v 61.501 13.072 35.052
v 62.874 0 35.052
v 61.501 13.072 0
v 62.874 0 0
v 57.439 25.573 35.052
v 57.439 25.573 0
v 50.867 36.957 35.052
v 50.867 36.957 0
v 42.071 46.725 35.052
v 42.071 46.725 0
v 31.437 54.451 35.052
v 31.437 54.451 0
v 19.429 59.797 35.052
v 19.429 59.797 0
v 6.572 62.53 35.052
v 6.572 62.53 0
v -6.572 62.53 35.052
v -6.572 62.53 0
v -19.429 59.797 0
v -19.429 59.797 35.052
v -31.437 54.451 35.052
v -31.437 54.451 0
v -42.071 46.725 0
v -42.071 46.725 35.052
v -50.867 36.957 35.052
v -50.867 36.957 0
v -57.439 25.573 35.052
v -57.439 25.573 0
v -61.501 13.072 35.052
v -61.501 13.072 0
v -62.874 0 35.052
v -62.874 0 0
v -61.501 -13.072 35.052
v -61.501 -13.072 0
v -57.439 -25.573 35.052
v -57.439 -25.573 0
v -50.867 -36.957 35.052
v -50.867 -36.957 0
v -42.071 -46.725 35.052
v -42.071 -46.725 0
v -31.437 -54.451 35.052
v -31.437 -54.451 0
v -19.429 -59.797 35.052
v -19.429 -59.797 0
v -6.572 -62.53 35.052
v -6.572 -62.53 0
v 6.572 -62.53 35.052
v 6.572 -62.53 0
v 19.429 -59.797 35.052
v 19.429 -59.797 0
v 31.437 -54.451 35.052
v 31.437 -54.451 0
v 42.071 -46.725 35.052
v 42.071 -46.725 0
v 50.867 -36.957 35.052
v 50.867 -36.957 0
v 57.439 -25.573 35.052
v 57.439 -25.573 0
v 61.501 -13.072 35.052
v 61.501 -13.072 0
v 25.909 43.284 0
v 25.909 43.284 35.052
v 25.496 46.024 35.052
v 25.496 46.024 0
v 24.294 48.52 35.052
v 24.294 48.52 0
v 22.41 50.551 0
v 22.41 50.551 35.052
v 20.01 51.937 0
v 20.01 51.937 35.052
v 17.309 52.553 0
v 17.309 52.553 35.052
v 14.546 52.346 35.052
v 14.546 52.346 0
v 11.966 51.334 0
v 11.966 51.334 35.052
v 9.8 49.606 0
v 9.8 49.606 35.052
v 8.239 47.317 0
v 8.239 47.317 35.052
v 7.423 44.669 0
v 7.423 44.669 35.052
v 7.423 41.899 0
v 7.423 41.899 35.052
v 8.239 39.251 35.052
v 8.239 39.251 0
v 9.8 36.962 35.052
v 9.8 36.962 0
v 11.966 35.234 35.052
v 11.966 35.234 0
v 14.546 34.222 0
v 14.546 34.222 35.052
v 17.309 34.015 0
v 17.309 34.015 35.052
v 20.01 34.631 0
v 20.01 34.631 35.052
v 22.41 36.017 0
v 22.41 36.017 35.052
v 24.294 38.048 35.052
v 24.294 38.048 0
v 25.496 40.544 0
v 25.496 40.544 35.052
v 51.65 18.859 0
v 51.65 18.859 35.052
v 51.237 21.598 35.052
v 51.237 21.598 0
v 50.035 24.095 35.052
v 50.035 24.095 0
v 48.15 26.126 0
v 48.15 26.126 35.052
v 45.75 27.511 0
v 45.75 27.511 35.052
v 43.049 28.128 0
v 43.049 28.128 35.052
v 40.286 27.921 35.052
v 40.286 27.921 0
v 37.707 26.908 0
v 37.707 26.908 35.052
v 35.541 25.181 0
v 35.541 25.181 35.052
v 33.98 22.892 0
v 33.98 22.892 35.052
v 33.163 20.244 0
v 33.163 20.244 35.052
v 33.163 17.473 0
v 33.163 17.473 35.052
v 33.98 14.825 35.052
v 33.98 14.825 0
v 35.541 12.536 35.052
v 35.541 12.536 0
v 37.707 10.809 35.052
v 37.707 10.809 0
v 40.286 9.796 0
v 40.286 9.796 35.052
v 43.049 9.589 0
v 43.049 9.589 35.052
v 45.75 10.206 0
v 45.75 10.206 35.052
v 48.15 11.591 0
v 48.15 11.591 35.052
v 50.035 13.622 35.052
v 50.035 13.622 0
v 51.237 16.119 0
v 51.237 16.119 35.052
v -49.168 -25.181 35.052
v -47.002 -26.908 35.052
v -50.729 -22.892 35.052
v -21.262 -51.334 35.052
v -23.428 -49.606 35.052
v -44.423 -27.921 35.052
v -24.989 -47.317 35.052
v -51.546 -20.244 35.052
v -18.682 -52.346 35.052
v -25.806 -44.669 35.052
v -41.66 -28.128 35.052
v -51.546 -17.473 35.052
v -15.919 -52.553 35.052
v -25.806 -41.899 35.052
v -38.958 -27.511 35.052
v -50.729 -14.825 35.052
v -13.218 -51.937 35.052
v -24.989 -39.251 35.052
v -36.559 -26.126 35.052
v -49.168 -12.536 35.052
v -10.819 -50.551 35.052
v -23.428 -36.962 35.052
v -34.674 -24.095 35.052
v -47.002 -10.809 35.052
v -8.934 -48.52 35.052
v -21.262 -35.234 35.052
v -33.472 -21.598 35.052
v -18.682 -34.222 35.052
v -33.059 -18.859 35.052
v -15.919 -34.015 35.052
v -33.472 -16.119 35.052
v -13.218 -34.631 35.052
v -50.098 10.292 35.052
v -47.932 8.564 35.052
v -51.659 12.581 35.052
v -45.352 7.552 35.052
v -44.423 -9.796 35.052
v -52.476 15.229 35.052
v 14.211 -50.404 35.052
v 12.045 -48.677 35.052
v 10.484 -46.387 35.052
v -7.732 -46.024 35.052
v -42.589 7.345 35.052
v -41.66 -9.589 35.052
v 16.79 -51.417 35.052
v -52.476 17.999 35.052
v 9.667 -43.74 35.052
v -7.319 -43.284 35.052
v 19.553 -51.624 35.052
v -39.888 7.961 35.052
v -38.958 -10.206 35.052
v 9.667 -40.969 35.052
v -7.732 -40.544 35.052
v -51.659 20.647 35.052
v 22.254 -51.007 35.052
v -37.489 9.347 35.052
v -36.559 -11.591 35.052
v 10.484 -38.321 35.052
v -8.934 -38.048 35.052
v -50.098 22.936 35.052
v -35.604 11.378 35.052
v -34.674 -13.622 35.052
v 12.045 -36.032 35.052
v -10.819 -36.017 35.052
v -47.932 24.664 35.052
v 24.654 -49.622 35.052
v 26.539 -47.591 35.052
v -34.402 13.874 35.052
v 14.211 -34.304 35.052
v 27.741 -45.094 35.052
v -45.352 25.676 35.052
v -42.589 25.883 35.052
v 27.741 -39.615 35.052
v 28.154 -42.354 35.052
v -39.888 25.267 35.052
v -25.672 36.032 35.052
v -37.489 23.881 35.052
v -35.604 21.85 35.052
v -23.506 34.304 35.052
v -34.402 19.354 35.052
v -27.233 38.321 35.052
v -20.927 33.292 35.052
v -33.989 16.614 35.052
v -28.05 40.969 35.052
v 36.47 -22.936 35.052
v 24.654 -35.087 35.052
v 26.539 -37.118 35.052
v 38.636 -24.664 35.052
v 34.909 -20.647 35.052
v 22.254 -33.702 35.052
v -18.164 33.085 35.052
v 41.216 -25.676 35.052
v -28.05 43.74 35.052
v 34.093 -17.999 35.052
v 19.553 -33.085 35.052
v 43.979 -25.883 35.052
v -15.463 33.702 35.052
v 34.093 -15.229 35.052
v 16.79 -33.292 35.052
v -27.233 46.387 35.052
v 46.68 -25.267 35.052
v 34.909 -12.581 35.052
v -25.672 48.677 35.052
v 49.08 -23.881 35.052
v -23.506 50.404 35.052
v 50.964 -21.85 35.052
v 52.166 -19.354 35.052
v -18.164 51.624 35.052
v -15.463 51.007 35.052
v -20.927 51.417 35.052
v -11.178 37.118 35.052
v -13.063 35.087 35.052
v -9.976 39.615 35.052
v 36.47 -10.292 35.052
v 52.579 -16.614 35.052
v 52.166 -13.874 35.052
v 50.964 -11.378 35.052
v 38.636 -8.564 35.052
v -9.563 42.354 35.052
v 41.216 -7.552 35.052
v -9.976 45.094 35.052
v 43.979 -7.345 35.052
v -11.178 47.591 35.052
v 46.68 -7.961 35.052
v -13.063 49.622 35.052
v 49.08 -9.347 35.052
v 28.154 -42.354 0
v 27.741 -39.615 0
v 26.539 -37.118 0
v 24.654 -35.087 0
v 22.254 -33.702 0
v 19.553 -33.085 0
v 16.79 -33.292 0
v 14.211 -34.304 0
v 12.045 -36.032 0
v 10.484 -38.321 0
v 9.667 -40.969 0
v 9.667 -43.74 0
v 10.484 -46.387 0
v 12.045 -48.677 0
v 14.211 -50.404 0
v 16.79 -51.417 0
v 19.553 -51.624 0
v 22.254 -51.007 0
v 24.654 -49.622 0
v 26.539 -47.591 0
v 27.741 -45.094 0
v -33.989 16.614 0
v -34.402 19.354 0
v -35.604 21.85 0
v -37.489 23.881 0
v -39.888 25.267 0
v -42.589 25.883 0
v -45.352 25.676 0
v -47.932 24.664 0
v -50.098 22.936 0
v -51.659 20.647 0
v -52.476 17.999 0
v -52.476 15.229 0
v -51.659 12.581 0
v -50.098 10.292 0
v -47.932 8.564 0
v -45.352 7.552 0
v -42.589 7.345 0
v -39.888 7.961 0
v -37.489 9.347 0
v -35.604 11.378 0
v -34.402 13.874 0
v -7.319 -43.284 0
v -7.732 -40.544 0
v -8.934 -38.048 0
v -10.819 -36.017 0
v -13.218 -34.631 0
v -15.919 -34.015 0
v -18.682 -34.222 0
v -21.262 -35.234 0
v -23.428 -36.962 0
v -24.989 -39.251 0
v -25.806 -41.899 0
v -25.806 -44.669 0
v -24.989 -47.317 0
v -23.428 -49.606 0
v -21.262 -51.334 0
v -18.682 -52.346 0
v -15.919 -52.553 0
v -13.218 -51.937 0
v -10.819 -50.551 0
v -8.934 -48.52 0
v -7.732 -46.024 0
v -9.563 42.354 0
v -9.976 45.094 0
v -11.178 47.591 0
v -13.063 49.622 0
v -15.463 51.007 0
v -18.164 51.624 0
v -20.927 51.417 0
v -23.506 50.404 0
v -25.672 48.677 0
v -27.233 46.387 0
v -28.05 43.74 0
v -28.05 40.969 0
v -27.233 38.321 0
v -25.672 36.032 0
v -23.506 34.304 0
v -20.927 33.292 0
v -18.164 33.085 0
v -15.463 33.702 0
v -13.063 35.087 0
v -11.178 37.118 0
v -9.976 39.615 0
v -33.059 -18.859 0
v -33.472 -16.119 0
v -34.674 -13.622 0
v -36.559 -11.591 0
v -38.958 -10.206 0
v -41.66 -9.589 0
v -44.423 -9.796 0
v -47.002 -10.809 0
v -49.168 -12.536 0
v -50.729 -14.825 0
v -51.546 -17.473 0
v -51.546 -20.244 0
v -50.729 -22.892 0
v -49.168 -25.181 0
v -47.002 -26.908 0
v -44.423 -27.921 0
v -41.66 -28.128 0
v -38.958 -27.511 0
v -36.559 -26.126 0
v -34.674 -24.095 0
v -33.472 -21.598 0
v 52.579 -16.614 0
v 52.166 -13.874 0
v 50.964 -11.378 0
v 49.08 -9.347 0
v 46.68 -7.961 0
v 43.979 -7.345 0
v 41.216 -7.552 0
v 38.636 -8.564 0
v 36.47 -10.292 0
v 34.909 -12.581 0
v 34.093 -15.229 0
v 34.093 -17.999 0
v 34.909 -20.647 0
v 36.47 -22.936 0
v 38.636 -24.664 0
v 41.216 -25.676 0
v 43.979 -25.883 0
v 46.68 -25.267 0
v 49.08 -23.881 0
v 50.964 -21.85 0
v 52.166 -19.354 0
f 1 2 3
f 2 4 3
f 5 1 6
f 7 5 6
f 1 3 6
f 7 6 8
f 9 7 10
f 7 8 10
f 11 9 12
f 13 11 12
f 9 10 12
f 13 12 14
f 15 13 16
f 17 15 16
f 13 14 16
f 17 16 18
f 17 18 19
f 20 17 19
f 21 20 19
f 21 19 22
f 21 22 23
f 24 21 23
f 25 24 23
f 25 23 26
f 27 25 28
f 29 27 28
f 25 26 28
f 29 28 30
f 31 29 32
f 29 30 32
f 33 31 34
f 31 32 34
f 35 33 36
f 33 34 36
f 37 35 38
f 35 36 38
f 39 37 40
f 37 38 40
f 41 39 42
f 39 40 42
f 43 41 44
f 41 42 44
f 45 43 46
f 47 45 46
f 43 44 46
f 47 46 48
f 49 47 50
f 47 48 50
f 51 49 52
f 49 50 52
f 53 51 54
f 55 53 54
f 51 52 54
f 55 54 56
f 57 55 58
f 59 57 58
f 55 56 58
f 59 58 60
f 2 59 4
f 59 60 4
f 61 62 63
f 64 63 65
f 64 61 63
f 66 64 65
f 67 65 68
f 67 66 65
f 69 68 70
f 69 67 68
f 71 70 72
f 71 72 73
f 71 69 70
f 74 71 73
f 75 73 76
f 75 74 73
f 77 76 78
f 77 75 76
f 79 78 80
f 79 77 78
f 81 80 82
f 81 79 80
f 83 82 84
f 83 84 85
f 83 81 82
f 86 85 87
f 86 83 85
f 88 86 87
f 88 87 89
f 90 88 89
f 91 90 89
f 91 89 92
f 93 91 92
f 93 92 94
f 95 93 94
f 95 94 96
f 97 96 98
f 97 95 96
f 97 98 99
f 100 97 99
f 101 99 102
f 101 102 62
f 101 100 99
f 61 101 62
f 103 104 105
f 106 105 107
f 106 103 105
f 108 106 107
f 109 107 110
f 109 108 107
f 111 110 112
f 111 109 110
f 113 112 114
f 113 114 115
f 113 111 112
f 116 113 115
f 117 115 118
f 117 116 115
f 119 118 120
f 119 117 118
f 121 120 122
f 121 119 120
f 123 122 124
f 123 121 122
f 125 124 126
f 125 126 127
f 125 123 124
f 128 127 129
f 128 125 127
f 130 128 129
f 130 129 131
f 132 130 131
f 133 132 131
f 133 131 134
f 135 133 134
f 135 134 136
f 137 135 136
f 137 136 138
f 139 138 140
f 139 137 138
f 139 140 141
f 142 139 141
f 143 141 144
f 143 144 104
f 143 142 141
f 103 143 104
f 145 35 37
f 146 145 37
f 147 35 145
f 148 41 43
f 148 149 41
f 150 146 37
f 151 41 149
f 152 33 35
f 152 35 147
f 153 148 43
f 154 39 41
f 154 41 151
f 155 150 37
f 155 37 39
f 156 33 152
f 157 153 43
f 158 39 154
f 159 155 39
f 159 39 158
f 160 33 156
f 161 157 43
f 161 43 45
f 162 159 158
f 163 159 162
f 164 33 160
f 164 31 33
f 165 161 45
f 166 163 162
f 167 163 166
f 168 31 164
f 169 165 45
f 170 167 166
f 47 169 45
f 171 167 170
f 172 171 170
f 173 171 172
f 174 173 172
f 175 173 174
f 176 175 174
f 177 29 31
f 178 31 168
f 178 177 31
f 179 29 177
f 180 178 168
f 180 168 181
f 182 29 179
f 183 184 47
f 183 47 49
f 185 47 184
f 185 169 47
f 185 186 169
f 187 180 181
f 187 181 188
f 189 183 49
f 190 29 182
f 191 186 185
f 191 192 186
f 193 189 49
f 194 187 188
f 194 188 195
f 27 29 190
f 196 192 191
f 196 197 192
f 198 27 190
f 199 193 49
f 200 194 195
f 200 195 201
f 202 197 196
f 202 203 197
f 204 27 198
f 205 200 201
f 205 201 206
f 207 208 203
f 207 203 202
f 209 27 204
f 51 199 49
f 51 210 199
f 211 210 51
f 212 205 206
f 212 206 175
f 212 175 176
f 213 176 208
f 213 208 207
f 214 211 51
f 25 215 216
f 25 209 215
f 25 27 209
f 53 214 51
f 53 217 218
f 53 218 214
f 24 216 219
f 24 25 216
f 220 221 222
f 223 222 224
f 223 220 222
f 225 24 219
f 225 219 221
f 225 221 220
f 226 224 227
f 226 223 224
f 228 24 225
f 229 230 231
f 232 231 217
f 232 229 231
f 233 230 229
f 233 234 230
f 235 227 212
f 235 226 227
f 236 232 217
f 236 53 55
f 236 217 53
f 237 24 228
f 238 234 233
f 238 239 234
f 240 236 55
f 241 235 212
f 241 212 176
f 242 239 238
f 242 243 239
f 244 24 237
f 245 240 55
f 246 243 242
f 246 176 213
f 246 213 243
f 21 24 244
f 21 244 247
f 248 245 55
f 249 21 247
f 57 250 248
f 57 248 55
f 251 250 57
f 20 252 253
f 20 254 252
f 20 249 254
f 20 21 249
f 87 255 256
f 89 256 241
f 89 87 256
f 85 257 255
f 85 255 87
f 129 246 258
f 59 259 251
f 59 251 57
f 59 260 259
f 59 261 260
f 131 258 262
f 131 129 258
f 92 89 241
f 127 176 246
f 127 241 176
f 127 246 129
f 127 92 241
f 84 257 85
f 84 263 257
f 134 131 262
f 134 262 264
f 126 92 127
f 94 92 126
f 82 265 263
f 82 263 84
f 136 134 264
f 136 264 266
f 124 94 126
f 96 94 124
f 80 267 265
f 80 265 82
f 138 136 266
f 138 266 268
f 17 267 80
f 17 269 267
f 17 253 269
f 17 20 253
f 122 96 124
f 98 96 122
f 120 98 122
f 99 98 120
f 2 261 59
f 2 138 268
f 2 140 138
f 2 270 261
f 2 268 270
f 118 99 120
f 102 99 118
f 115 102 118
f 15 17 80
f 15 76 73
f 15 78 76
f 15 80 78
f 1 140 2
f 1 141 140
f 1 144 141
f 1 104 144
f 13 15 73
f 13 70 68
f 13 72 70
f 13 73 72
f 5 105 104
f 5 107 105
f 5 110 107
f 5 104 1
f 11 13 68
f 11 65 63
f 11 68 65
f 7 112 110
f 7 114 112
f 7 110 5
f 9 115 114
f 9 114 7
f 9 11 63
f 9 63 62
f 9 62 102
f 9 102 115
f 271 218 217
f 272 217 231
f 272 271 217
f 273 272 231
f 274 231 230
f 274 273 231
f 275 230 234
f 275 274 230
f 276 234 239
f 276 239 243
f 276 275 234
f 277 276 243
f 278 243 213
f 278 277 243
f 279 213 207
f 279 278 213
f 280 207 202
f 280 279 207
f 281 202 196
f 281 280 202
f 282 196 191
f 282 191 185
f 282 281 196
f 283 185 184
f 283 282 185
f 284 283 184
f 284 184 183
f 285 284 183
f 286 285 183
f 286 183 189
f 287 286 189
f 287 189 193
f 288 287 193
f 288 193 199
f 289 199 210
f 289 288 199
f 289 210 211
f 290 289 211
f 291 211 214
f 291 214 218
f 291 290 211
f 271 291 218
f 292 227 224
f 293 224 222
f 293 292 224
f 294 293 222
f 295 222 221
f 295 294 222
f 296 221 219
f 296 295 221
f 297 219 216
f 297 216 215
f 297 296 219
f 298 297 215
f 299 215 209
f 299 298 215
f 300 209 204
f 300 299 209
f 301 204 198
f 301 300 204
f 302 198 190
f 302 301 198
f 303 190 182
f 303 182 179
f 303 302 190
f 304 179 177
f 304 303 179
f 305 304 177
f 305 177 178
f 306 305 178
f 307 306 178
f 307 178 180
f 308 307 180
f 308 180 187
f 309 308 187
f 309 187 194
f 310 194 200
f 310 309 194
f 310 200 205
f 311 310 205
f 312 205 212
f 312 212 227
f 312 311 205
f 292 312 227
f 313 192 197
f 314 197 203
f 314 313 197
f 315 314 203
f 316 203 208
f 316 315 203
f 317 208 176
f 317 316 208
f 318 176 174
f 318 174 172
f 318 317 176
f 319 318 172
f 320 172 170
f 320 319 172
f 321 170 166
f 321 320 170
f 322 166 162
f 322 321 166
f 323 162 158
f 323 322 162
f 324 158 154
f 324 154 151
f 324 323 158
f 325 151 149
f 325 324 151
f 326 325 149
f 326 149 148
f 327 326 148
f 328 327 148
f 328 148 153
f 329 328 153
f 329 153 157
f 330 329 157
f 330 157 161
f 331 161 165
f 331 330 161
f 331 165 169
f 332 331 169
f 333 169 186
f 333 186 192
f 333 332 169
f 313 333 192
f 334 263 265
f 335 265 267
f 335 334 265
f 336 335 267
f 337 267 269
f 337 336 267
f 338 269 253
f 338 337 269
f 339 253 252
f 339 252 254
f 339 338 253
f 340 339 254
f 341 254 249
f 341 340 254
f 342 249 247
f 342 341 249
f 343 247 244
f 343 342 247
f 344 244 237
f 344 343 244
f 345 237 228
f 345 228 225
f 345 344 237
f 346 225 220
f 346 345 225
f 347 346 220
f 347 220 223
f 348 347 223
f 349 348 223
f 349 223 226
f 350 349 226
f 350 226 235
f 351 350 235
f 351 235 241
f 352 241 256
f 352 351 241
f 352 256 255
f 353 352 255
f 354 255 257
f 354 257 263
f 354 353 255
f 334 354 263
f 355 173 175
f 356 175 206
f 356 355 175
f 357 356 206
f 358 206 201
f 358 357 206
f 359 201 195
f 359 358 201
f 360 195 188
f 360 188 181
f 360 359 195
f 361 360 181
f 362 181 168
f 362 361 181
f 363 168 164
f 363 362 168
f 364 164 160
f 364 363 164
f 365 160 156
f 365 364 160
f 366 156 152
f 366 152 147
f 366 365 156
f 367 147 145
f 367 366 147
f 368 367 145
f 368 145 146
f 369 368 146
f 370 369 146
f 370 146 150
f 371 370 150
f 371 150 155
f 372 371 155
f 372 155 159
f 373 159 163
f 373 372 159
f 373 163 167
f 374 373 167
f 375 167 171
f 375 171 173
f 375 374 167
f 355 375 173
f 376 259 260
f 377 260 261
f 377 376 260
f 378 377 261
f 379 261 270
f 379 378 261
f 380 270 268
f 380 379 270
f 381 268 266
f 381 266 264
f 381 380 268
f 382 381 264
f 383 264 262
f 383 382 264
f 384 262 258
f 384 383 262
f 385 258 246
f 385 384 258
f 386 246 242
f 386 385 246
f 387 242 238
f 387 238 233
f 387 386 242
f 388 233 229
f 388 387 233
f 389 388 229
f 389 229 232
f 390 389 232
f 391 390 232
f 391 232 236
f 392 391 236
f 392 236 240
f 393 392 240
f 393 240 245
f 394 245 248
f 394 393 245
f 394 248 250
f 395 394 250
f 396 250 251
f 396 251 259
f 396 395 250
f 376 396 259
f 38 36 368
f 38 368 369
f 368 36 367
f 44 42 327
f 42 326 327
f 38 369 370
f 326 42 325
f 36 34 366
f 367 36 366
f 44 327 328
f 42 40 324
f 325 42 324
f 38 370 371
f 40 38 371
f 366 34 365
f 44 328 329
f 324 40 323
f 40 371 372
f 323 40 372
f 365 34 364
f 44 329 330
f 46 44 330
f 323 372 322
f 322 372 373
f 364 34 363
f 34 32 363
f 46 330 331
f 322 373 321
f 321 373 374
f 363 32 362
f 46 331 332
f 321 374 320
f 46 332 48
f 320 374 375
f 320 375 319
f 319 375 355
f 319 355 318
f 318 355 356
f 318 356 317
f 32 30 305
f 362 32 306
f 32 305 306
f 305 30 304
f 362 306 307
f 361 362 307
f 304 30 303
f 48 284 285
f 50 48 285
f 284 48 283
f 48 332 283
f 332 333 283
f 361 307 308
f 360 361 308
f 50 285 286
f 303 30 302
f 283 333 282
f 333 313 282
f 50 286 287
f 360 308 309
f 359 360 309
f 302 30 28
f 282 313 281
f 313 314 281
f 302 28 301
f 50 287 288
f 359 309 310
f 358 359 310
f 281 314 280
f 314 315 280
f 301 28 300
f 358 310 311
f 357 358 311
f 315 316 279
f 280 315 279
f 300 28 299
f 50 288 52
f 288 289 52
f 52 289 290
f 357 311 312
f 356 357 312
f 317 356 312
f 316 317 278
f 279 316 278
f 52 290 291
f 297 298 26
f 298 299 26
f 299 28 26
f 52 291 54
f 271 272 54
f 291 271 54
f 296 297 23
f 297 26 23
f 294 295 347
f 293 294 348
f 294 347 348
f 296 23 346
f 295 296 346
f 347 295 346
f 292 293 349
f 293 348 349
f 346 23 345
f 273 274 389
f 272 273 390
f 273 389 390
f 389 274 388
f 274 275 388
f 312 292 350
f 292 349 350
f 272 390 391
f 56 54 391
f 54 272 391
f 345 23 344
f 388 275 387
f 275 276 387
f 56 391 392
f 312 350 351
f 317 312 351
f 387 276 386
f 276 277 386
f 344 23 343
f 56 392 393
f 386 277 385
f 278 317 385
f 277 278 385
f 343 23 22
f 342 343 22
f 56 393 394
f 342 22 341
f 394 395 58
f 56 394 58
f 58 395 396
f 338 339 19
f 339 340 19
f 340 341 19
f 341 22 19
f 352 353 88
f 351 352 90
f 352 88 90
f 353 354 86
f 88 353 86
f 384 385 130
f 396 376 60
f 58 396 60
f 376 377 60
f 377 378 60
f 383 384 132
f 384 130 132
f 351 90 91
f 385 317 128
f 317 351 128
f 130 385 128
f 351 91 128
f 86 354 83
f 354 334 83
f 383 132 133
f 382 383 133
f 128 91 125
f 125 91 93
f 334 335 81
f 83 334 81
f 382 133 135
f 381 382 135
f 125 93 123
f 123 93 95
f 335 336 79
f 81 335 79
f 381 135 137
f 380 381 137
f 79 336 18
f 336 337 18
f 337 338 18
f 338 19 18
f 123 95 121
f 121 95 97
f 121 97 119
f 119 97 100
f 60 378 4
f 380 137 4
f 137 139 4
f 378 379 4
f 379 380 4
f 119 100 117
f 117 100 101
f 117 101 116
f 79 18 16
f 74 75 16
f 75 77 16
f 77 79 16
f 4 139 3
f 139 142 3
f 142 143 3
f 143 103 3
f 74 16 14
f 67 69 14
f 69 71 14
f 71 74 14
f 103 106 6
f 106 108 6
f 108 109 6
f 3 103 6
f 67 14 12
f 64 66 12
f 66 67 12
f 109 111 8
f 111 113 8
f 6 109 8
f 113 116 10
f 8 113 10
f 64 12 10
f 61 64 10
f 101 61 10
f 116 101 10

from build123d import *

# Parameters (mm, degrees)
F0_R        = 62.874462
F0_R_2      = 9.295278
F1_DEPTH    = 9.652
F1_FACE_R   = 62.874462
F1_FACE_R_2 = 9.295278
F2_DEPTH    = 25.4


with BuildPart() as f1:
    # F0 (on Top) → F1 (new body)
    with BuildSketch(Plane.XY):
        Circle(F0_R)
        with Locations((-16.614098, -43.2841)):
            Circle(F0_R_2, mode=Mode.SUBTRACT)
        with Locations((-42.354422, -18.858539)):
            Circle(F0_R_2, mode=Mode.SUBTRACT)
        with Locations((18.858539, -42.354422)):
            Circle(F0_R_2, mode=Mode.SUBTRACT)
        with Locations((43.2841, -16.614098)):
            Circle(F0_R_2, mode=Mode.SUBTRACT)
        with Locations((-43.2841, 16.614098)):
            Circle(F0_R_2, mode=Mode.SUBTRACT)
        with Locations((-18.858539, 42.354422)):
            Circle(F0_R_2, mode=Mode.SUBTRACT)
        with Locations((42.354422, 18.858539)):
            Circle(F0_R_2, mode=Mode.SUBTRACT)
        with Locations((16.614098, 43.2841)):
            Circle(F0_R_2, mode=Mode.SUBTRACT)
    extrude(amount=F1_DEPTH)

    # F1_face (on face) → F2 (join)
    with BuildSketch(Plane.XY.offset(9.652)):
        Circle(F1_FACE_R)
        with Locations((-16.614098, -43.2841)):
            Circle(F1_FACE_R_2, mode=Mode.SUBTRACT)
        with Locations((-42.354422, -18.858539)):
            Circle(F1_FACE_R_2, mode=Mode.SUBTRACT)
        with Locations((18.858539, -42.354422)):
            Circle(F1_FACE_R_2, mode=Mode.SUBTRACT)
        with Locations((43.2841, -16.614098)):
            Circle(F1_FACE_R_2, mode=Mode.SUBTRACT)
        with Locations((-43.2841, 16.614098)):
            Circle(F1_FACE_R_2, mode=Mode.SUBTRACT)
        with Locations((-18.858539, 42.354422)):
            Circle(F1_FACE_R_2, mode=Mode.SUBTRACT)
        with Locations((42.354422, 18.858539)):
            Circle(F1_FACE_R_2, mode=Mode.SUBTRACT)
        with Locations((16.614098, 43.2841)):
            Circle(F1_FACE_R_2, mode=Mode.SUBTRACT)
    extrude(amount=F2_DEPTH)


solid = f1.part
